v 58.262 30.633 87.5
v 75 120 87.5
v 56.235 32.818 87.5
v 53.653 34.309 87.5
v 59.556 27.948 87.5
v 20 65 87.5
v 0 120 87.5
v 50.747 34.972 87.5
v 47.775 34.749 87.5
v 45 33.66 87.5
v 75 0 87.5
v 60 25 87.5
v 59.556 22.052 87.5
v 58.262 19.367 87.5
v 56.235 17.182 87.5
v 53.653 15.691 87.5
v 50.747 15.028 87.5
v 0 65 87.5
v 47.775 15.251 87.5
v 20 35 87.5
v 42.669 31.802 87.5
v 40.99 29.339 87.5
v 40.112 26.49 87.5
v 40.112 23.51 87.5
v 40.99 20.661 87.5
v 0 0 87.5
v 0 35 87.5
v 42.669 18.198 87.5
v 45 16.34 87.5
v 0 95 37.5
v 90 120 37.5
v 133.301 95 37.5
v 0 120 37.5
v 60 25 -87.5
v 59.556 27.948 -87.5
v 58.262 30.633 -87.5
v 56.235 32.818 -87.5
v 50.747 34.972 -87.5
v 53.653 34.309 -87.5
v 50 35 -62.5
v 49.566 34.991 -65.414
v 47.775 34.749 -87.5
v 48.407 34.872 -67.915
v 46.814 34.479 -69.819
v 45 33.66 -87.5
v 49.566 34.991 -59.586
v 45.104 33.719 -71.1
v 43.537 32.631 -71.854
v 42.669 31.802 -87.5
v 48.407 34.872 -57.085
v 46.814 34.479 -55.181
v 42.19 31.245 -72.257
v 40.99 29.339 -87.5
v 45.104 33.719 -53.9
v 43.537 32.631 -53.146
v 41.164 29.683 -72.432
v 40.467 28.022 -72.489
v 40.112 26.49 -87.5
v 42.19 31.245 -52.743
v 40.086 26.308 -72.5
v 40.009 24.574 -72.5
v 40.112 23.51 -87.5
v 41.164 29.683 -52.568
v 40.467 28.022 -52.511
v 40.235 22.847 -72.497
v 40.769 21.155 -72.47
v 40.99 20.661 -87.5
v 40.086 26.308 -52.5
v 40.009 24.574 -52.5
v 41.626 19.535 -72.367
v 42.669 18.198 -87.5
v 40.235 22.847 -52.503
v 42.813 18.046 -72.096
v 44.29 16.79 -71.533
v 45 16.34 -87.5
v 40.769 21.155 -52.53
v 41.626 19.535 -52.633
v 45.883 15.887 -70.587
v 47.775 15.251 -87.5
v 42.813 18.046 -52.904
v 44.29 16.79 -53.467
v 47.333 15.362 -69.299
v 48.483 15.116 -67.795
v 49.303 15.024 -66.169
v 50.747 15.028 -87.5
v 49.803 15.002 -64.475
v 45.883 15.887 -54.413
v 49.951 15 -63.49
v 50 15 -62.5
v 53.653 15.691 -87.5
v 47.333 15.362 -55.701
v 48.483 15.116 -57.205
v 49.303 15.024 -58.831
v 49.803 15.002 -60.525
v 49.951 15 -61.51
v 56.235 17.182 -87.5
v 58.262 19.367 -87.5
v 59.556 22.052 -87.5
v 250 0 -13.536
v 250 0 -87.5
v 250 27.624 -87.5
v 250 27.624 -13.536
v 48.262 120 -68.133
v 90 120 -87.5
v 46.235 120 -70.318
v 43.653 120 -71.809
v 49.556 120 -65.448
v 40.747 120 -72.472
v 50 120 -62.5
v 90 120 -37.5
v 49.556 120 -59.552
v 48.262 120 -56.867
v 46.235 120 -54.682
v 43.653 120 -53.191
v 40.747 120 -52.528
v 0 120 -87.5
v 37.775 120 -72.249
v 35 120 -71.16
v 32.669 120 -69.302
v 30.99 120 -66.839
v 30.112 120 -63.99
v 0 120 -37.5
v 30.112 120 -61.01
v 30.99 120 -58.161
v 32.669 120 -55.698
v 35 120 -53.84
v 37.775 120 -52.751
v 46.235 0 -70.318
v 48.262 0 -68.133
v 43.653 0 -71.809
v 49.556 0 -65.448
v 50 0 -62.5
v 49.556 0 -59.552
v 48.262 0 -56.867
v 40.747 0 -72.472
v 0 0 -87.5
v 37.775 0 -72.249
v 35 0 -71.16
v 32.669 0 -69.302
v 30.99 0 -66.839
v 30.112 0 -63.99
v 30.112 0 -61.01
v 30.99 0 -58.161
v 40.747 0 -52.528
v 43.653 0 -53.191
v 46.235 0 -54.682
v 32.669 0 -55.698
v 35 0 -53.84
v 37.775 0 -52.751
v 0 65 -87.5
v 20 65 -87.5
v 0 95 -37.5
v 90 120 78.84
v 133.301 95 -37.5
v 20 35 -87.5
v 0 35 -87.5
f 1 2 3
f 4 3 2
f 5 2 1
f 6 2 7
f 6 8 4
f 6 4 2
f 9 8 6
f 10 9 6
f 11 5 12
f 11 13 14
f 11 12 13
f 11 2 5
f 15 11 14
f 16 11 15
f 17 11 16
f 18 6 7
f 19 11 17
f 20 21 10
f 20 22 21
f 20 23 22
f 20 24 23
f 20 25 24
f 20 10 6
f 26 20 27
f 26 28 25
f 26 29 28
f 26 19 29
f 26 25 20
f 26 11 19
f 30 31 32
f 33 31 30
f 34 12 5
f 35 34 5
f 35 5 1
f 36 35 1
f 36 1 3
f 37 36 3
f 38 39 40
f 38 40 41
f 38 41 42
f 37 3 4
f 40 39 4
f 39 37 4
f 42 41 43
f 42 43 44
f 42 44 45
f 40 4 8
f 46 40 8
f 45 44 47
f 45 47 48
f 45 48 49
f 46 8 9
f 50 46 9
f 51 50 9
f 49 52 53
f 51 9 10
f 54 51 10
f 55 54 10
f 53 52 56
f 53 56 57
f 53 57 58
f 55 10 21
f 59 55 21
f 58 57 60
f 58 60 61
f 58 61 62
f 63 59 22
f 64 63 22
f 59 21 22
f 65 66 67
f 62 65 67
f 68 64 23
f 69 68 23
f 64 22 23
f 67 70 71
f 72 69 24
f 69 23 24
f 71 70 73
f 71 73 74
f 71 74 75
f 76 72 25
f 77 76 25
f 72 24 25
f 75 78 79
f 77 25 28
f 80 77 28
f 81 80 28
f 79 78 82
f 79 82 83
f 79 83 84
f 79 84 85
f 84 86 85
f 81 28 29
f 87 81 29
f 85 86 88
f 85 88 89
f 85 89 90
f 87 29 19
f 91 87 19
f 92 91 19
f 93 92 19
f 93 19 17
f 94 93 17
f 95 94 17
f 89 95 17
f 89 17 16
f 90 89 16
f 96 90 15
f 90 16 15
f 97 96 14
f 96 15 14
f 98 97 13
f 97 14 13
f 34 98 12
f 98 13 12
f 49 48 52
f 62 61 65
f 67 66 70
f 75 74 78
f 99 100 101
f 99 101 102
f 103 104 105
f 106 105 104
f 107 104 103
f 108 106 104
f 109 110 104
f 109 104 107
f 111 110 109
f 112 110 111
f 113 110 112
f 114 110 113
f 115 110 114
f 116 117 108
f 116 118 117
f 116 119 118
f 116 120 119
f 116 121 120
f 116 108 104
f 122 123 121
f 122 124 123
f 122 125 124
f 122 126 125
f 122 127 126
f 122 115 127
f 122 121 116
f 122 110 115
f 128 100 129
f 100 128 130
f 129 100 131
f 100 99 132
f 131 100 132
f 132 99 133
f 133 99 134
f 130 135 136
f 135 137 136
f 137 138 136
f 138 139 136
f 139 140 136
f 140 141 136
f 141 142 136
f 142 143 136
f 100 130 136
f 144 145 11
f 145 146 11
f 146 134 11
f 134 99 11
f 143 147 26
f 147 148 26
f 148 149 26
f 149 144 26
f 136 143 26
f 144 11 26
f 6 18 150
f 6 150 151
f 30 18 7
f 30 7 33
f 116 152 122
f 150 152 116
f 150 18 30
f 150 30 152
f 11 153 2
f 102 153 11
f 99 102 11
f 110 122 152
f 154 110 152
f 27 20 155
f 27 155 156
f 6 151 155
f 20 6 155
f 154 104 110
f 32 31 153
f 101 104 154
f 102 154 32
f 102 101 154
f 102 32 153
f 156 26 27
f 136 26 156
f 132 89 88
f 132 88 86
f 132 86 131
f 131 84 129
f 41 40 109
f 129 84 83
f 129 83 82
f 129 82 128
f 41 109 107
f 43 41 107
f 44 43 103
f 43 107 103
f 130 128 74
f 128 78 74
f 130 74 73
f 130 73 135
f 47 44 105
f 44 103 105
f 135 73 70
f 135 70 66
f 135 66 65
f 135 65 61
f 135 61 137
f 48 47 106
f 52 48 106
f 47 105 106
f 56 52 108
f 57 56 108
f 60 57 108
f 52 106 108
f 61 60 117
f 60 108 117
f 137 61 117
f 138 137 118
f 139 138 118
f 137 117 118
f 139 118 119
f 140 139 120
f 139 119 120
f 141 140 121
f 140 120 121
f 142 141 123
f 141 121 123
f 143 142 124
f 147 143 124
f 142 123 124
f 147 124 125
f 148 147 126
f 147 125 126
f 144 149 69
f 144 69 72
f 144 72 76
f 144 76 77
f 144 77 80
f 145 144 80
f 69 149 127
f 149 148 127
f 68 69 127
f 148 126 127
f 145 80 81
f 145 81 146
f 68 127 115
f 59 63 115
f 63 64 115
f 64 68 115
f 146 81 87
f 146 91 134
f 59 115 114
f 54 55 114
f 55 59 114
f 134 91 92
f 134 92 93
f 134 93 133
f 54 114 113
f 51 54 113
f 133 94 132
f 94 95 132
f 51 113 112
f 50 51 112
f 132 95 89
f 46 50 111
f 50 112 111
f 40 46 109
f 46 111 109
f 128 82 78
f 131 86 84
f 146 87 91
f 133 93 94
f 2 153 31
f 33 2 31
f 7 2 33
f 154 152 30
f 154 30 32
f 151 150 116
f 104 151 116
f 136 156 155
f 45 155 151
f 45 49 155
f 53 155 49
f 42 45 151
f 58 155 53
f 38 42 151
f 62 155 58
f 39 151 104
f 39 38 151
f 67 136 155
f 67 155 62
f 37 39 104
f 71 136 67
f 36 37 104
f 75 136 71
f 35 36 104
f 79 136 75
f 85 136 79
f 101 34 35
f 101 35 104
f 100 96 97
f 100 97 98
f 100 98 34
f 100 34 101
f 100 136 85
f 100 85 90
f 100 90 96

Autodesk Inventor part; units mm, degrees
sketch "Sketch2" plane through (0, 0, 0) normal (0, 1, 0) x (-1, 0, 0)
  line L0 (0, -87.5) -> (-250, -87.5)
  line L1 (-250, -87.5) -> (-250, 87.5)
  line L2 (-250, 87.5) -> (0, 87.5)
  line L3 (0, 87.5) -> (0, -87.5)
  line L4 (0, -122.5) -> (0, 122.5) projected
  line L5 (-300, 0) -> (50, 0) projected
  point P0 (0, 0)
  dimension "d0" = 0
  dimension "d1" = 250
  dimension "d2" = 175
  dimension "d3" = 87.5
extrude "Extrusion1" add sketch "Sketch2" along normal blind 120
chamfer "Chamfer1" distance 175 angle 30 1 edges at (250, 60, 87.5) measured on face at (83.3333, 40, 87.5)
chamfer "Chamfer2" distance 160 angle 30 1 edges at (250, 120, -50.5181) measured on face at (108.3333, 120, -4.5121)
sketch "Sketch4" plane through (0, 0, 87.5) normal (0, 0, 1) x (1, 0, 0)
  line L0 (0, 65) -> (20, 65)
  line L1 (20, 65) -> (20, 35)
  line L2 (20, 35) -> (0, 35)
  line L3 (0, 35) -> (0, 65)
  line L4 (0, 144) -> (0, -24) projected
  line L5 (-50, 0) -> (300, 0) projected
  point P0 (0, 0)
  dimension "d15" = 0
  dimension "d16" = 30
  dimension "d17" = 20
  dimension "d18" = 35
sketch "Sketch6" plane through (0, 0, 87.5) normal (0, 0, 1) x (1, 0, 0)
  circle A0 centre (50, 25) radius 10
  line L0 (-50, 0) -> (300, 0) projected
  line L1 (0, 144) -> (0, -24) projected
  point P0 (0, 0)
  dimension "d23" = 20
  dimension "d24" = 25
  dimension "d25" = 50
sketch "Sketch7" plane through (250, 0, -87.5) normal (0, 0, -1) x (-1, 0, 0)
  line L0 (230, 35) -> (250, 35) projected
  line L1 (250, 65) -> (230, 65) projected
  line L2 (230, 65) -> (230, 35) projected
  point P0 (250, 0)
extrude "Extrusion3" cut sketch "Sketch4" against normal up to next
extrude "Extrusion4" cut sketch "Sketch6" against normal up to surface (175 mm away)
sketch "Sketch8" plane through (0, 120, 0) normal (0, 1, 0) x (1, 0, 0)
  circle A0 centre (40, 62.5) radius 10
  line L0 (90, 87.5) -> (0, 87.5) projected
  line L1 (0, 87.5) -> (0, -87.5) projected
  point P0 (0, 0)
  dimension "d28" = 20
  dimension "d29" = 25
  dimension "d30" = 40
extrude "Extrusion5" cut sketch "Sketch8" against normal up to surface (120 mm away)
sketch "Sketch9" plane through (0, 120, 0) normal (0, 1, 0) x (1, 0, 0)
  line L0 (0, 37.5) -> (250, 37.5)
  line L1 (250, 37.5) -> (250, -37.5)
  line L2 (250, -37.5) -> (0, -37.5)
  line L3 (0, -37.5) -> (0, 37.5)
  line L4 (90, 87.5) -> (0, 87.5) projected
  line L5 (0, 87.5) -> (0, -87.5) projected
  point P0 (0, 0)
  dimension "d33" = 50
  dimension "d34" = 75
  dimension "d35" = 0
  dimension "d36" = 250
extrude "Extrusion6" cut sketch "Sketch9" against normal blind 25
equation "\"d3\" = 0.5 * d2"
properties part number "chap3ex3"
